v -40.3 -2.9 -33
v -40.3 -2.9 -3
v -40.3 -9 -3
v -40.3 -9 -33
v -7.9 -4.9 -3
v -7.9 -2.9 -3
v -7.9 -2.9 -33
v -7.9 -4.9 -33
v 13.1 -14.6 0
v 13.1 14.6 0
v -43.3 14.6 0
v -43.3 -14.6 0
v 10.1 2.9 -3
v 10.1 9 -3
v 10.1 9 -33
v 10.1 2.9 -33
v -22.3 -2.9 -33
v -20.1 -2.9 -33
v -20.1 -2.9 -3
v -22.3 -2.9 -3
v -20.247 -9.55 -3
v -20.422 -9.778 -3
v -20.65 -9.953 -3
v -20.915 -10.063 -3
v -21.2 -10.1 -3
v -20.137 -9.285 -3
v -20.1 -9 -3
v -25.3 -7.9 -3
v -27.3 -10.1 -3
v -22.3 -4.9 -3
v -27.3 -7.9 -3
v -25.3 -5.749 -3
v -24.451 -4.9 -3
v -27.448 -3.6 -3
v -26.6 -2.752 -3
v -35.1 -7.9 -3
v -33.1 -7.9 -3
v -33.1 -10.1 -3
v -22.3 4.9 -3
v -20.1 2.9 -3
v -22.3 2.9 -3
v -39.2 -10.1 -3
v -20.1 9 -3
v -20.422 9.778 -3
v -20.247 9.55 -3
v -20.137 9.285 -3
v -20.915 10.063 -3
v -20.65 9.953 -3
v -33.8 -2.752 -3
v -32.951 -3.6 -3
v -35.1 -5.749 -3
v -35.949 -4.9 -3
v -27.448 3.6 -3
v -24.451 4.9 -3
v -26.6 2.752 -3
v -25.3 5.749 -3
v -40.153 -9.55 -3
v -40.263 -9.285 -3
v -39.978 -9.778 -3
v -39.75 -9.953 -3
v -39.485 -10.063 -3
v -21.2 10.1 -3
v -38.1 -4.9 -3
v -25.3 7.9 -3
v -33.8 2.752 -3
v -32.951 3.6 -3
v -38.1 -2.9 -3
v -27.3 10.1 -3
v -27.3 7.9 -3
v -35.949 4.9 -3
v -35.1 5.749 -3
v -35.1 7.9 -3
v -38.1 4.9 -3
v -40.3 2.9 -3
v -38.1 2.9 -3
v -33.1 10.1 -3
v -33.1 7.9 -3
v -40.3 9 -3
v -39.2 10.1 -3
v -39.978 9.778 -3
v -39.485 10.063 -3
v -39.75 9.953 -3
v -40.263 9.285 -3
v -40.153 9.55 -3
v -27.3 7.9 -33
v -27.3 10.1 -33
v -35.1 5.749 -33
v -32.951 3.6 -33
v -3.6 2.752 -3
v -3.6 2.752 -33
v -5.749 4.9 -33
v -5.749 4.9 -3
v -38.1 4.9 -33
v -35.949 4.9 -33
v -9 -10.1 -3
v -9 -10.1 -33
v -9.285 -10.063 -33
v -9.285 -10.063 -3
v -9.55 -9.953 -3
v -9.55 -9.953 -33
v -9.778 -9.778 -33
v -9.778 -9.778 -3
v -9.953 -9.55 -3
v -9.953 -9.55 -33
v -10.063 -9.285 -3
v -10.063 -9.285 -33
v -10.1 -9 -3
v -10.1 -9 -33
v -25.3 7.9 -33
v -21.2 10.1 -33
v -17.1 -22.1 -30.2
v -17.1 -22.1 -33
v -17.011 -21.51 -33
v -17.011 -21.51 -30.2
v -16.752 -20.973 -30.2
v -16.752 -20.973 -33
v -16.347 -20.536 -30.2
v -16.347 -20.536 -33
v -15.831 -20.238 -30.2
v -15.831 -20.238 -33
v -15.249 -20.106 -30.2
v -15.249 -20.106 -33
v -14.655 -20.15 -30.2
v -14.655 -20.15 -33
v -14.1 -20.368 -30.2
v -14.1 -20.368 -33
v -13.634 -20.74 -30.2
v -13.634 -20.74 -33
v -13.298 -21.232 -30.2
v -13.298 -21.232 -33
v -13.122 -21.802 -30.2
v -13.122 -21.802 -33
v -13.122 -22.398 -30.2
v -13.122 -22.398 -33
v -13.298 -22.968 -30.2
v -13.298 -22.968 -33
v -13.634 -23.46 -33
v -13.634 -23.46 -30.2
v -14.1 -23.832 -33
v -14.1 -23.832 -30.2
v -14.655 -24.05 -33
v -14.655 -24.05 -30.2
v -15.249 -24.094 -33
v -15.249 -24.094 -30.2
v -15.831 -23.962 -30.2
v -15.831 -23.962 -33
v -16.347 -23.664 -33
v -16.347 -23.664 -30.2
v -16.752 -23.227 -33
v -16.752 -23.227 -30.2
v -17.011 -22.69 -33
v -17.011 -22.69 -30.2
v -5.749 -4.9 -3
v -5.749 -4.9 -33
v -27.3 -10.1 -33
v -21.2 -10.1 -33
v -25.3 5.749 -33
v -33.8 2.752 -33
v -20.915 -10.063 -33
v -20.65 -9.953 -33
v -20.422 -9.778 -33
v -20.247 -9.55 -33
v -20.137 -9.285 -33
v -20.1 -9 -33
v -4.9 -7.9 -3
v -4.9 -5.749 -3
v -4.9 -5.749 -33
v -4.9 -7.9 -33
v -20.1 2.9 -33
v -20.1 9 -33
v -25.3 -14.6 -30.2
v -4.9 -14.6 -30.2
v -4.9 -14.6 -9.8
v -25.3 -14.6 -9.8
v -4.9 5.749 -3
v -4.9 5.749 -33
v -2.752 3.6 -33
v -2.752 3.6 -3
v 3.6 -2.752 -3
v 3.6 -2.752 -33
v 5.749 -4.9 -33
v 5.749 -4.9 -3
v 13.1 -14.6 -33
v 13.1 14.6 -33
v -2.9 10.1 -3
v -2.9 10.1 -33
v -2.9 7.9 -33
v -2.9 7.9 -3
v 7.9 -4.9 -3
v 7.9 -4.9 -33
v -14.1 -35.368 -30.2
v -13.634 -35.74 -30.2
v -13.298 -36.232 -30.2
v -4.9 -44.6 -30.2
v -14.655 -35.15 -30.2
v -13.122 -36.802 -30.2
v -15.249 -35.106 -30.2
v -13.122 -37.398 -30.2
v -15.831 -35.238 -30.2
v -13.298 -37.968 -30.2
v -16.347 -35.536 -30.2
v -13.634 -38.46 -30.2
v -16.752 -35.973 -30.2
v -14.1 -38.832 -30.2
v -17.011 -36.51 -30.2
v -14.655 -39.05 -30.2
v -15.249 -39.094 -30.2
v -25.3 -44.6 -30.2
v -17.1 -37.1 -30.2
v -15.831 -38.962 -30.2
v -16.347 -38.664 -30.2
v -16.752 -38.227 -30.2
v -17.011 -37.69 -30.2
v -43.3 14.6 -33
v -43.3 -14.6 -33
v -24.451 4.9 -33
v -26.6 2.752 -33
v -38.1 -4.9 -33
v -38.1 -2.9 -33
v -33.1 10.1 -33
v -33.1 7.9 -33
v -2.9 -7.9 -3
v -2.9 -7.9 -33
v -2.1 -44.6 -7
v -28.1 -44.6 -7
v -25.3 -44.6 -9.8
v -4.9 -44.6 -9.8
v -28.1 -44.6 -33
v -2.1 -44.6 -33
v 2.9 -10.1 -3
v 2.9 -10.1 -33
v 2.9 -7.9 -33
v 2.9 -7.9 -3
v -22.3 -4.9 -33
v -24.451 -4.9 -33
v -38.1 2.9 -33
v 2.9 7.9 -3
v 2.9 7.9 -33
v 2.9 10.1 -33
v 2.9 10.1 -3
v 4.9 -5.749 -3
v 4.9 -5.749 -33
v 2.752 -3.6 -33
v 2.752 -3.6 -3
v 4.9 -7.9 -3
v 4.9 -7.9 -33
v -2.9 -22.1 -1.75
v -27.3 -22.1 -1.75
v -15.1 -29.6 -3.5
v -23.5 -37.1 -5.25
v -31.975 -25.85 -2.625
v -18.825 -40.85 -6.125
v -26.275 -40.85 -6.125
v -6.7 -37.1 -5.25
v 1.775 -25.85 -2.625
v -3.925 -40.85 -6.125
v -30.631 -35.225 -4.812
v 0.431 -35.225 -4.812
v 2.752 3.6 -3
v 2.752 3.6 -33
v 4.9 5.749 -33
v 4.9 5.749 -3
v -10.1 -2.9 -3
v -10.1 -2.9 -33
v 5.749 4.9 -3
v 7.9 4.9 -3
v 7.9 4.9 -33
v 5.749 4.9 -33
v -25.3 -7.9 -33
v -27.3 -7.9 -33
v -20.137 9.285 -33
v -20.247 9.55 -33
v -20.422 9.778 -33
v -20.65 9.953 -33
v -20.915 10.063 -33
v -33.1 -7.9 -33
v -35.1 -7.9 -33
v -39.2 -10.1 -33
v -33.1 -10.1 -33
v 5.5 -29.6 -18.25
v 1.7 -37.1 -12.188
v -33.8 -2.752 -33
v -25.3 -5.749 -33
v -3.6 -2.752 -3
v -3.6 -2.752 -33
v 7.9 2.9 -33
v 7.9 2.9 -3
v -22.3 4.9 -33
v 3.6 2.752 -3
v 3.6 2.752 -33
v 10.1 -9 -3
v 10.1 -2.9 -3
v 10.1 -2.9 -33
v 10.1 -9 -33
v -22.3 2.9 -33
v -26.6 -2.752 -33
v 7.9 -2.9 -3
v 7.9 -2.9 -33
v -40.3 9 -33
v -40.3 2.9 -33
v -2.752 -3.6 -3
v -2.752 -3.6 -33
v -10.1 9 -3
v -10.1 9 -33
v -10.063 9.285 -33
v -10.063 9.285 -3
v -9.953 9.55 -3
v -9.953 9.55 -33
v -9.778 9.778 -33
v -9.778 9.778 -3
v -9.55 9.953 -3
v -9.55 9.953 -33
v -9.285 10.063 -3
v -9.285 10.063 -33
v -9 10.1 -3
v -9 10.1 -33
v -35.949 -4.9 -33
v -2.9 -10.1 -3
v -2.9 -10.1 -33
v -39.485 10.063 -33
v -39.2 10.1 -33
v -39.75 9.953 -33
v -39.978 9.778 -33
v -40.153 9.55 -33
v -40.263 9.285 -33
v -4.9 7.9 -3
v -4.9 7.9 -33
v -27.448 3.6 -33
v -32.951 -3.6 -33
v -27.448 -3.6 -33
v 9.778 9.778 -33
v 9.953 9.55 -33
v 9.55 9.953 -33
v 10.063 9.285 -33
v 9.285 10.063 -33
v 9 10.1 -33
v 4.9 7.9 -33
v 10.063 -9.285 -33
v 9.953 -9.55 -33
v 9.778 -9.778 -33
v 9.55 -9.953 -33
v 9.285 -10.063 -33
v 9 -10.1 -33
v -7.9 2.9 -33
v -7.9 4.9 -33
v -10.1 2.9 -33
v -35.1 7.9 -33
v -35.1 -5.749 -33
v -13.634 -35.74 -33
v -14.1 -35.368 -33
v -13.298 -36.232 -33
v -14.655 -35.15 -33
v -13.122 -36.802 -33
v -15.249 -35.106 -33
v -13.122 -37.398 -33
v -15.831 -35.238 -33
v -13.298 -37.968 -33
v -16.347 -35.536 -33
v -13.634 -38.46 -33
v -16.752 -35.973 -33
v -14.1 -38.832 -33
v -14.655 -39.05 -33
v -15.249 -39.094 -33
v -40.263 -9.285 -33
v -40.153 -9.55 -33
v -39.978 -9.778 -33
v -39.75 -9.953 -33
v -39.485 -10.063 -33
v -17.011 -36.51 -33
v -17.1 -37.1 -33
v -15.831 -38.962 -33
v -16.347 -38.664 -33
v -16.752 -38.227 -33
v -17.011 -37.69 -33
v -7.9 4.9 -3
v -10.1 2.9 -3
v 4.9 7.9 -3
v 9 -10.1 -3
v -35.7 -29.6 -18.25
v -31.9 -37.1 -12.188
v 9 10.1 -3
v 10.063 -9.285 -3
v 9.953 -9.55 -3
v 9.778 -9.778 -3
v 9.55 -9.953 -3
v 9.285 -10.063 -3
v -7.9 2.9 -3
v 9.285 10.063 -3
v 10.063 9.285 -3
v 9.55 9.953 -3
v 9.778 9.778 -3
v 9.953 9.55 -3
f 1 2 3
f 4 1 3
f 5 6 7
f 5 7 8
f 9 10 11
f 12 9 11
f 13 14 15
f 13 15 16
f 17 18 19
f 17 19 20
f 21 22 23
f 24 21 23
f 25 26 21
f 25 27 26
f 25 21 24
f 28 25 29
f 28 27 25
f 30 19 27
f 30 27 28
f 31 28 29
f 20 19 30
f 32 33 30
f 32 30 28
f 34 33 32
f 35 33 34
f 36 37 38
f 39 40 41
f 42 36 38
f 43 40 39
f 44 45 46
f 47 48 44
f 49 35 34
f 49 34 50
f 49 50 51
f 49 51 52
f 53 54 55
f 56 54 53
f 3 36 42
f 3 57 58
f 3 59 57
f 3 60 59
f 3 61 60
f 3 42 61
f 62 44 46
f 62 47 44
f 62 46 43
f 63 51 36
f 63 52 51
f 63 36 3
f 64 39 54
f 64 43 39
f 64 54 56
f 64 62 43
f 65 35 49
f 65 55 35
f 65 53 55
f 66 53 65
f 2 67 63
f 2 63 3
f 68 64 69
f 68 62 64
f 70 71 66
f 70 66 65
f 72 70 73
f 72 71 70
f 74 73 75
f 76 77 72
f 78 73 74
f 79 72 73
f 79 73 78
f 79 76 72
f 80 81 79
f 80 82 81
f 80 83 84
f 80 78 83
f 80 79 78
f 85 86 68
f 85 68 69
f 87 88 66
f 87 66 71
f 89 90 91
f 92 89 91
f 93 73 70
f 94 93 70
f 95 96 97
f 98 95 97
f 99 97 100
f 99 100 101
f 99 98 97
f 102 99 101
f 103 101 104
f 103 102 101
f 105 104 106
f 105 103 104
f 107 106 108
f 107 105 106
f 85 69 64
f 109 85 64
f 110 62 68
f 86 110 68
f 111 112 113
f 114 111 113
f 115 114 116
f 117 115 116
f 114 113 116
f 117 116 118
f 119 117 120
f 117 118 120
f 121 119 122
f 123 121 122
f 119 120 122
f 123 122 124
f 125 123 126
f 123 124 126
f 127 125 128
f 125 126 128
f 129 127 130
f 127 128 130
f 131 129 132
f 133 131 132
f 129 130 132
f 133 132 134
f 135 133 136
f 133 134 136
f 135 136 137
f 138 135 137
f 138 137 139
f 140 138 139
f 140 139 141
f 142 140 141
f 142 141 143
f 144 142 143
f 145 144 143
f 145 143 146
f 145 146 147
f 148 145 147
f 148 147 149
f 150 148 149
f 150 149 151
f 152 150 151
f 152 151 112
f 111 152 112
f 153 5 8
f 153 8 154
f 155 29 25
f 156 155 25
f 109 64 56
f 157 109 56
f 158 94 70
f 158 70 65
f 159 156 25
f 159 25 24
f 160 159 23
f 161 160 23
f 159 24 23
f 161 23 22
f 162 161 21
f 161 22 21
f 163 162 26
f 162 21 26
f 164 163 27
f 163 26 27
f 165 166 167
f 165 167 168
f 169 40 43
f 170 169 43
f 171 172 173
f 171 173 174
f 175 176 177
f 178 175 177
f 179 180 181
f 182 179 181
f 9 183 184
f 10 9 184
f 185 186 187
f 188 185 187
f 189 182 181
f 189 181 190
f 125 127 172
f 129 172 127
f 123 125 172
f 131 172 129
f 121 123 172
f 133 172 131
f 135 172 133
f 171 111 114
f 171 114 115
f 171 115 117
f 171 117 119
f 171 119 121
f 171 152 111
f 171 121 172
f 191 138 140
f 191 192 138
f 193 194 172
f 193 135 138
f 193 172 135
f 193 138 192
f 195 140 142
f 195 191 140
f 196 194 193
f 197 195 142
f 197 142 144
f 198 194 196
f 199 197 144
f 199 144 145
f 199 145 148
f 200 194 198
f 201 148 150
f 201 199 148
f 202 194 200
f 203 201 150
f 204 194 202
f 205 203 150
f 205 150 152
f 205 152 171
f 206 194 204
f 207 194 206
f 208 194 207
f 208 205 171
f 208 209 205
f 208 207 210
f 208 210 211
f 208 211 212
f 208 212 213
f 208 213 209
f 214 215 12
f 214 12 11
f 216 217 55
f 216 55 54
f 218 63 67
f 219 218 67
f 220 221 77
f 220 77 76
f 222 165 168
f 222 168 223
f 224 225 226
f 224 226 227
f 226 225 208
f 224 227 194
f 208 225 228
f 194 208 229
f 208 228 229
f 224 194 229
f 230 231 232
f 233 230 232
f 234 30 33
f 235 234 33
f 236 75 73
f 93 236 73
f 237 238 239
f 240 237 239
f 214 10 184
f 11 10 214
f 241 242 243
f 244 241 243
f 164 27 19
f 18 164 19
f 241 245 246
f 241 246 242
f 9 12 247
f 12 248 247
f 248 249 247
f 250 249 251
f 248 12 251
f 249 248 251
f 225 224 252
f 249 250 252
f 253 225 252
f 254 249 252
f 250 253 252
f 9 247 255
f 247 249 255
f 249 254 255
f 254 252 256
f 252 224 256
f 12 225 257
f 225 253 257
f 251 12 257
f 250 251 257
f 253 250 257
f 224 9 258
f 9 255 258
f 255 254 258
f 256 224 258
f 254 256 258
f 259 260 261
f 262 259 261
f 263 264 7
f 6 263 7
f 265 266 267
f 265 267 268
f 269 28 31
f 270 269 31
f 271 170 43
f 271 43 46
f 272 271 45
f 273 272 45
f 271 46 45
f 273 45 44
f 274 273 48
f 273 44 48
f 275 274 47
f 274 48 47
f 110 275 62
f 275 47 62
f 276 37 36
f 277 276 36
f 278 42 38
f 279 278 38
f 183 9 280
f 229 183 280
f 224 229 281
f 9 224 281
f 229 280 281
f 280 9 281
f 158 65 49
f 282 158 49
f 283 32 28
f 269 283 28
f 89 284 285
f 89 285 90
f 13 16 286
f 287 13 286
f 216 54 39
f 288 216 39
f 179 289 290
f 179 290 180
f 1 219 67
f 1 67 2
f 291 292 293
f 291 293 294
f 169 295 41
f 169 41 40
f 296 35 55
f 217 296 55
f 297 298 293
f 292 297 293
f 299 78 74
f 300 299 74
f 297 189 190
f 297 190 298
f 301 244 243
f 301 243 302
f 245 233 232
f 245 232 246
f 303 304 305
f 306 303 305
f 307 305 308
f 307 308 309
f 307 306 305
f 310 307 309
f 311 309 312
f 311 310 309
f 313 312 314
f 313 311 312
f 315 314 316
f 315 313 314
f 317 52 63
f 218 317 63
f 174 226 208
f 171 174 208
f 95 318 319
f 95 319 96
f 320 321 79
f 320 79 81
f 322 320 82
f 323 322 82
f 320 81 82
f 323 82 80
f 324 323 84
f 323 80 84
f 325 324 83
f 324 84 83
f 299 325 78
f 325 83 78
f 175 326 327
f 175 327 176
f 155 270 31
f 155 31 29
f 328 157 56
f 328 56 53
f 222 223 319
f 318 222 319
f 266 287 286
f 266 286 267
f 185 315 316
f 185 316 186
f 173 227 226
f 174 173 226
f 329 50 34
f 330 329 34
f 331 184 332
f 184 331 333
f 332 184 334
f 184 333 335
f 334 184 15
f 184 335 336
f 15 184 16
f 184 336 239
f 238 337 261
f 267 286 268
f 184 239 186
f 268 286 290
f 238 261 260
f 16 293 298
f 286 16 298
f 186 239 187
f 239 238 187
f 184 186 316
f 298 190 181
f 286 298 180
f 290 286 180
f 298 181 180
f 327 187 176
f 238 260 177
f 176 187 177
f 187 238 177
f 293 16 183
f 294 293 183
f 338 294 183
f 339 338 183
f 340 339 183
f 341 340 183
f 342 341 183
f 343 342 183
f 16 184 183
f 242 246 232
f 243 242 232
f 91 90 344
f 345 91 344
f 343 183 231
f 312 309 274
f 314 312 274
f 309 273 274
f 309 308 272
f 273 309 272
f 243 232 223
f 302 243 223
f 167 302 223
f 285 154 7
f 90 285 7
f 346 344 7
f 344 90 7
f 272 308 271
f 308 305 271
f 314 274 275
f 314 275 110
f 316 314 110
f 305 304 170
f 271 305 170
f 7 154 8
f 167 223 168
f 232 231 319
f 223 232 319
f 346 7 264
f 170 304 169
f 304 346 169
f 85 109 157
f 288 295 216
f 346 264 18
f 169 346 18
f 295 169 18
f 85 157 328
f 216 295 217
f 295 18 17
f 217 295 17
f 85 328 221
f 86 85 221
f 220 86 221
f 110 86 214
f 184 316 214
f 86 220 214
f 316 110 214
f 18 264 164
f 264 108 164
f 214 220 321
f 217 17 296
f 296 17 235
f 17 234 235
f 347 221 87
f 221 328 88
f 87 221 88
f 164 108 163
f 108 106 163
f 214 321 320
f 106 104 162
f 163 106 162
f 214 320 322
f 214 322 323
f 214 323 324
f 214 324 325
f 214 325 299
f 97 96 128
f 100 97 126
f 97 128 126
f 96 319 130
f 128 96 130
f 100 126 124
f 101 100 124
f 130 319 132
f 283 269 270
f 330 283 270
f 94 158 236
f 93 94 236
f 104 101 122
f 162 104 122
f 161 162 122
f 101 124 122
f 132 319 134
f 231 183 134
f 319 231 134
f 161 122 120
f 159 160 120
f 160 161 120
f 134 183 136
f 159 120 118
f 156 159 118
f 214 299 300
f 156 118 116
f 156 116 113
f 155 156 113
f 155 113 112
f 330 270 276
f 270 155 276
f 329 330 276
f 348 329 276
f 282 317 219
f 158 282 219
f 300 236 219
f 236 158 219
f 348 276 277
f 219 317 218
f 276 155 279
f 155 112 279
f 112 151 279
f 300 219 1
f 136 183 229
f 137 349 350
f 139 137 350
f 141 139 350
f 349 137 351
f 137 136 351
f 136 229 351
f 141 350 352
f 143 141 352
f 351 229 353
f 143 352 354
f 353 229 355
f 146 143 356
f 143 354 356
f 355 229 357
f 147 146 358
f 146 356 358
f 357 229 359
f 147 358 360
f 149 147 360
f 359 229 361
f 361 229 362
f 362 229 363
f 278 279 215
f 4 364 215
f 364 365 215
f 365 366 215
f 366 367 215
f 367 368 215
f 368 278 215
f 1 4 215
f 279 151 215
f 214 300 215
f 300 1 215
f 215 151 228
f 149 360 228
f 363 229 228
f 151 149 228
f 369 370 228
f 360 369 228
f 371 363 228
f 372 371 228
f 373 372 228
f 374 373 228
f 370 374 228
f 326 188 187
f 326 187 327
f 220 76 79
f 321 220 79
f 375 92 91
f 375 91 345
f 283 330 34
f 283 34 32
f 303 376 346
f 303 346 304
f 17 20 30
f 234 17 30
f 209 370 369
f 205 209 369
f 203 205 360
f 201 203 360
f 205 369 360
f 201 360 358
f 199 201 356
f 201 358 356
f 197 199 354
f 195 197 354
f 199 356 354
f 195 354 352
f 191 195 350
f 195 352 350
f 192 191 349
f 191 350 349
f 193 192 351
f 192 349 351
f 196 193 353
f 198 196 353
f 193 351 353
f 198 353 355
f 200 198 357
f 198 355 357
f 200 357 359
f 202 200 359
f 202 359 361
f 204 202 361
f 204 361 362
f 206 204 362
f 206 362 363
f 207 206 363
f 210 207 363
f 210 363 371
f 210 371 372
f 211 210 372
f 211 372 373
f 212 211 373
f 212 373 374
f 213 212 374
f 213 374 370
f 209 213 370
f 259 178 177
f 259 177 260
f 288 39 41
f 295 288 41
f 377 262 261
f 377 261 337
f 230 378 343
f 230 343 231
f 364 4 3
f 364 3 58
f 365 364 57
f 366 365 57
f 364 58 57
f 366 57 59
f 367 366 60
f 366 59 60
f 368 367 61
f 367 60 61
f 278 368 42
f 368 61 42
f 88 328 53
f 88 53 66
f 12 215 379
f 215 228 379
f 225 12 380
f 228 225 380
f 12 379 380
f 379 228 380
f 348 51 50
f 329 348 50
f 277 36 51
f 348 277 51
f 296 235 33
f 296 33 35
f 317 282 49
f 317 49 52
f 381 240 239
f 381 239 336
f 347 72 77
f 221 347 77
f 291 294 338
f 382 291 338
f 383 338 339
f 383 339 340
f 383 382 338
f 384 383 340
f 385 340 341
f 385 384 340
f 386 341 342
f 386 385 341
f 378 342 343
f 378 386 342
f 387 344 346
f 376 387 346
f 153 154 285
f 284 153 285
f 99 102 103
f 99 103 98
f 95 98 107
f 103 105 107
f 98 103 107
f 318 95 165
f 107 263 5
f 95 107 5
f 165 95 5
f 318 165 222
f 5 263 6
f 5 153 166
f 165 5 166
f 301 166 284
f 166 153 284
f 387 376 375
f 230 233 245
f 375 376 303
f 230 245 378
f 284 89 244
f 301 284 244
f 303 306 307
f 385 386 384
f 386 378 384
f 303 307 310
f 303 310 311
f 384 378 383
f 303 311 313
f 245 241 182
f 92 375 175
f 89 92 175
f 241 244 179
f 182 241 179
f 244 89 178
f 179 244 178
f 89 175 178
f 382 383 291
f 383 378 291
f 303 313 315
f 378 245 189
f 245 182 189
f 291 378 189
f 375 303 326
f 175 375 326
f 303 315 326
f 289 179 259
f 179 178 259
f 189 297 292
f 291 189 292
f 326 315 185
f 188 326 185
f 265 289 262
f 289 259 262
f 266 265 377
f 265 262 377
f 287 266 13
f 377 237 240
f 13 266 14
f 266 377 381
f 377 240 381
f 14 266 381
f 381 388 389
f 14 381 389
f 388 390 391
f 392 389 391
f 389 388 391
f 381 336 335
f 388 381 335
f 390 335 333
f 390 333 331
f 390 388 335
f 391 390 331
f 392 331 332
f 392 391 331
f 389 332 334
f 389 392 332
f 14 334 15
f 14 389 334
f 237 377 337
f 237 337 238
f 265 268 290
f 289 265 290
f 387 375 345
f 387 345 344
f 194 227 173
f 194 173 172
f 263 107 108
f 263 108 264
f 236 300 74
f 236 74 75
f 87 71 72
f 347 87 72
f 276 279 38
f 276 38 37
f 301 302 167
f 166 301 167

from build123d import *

# Parameters (mm, degrees)
SKETCH1_W           = 28.2
SKETCH1_H           = 29.2
BOSS_EXTRUDE1_DEPTH = 3
BOSS_EXTRUDE2_START = -3
SKETCH1_3_W         = 28.2
SKETCH1_3_H         = 29.2
BOSS_EXTRUDE2_DEPTH = 30
SKETCH3_3_W         = 20.4
SKETCH3_3_H         = 20.4
CUT_EXTRUDE1_DEPTH  = 30
CUT_EXTRUDE2_REACH  = 72.378
SKETCH4_R           = 2


with BuildPart() as part:
    # Sketch1 → Boss-Extrude1 (new body)
    with BuildSketch(Plane.XY):
        with Locations((-1, 0)):
            Rectangle(SKETCH1_W, SKETCH1_H)
    boss_extrude1 = extrude(amount=-BOSS_EXTRUDE1_DEPTH)

    # Sketch1<3> → Boss-Extrude2 (add)
    with BuildSketch(Plane.XY.offset(BOSS_EXTRUDE2_START)):
        with Locations((-1, 0)):
            Rectangle(SKETCH1_3_W, SKETCH1_3_H)
        with BuildLine():
            Line((-10.1, 2.9), (-10.1, 9))
            ThreePointArc((-10.1, 9), (-9.777817459, 9.777817459), (-9, 10.1))
            Line((-9, 10.1), (-2.9, 10.1))
            Line((-2.9, 10.1), (-2.9, 7.9))
            Line((-2.9, 7.9), (-4.9, 7.9))
            Line((-4.9, 7.9), (-4.9, 5.749))
            Line((-4.9, 5.749), (-2.7515, 3.6005))
            Line((-2.7515, 3.6005), (2.7515, 3.6005))
            Line((2.7515, 3.6005), (4.9, 5.749))
            Line((4.9, 5.749), (4.9, 7.9))
            Line((4.9, 7.9), (2.9, 7.9))
            Line((2.9, 7.9), (2.9, 10.1))
            Line((2.9, 10.1), (9, 10.1))
            ThreePointArc((9, 10.1), (9.777817459, 9.777817459), (10.1, 9))
            Line((10.1, 9), (10.1, 2.9))
            Line((10.1, 2.9), (7.9, 2.9))
            Line((7.9, 2.9), (7.9, 4.9))
            Line((7.9, 4.9), (5.749, 4.9))
            Line((5.749, 4.9), (3.6005, 2.7515))
            Line((3.6005, 2.7515), (3.6005, -2.7515))
            Line((3.6005, -2.7515), (5.749, -4.9))
            Line((5.749, -4.9), (7.9, -4.9))
            Line((7.9, -4.9), (7.9, -2.9))
            Line((7.9, -2.9), (10.1, -2.9))
            Line((10.1, -2.9), (10.1, -9))
            ThreePointArc((10.1, -9), (9.777817459, -9.777817459), (9, -10.1))
            Line((9, -10.1), (2.9, -10.1))
            Line((2.9, -10.1), (2.9, -7.9))
            Line((2.9, -7.9), (4.9, -7.9))
            Line((4.9, -7.9), (4.9, -5.749))
            Line((4.9, -5.749), (2.7515, -3.6005))
            Line((2.7515, -3.6005), (-2.7515, -3.6005))
            Line((-2.7515, -3.6005), (-4.9, -5.749))
            Line((-4.9, -5.749), (-4.9, -7.9))
            Line((-4.9, -7.9), (-2.9, -7.9))
            Line((-2.9, -7.9), (-2.9, -10.1))
            Line((-2.9, -10.1), (-9, -10.1))
            ThreePointArc((-9, -10.1), (-9.777817459, -9.777817459), (-10.1, -9))
            Line((-10.1, -9), (-10.1, -2.9))
            Line((-10.1, -2.9), (-7.9, -2.9))
            Line((-7.9, -2.9), (-7.9, -4.9))
            Line((-7.9, -4.9), (-5.749, -4.9))
            Line((-5.749, -4.9), (-3.6005, -2.7515))
            Line((-3.6005, -2.7515), (-3.6005, 2.7515))
            Line((-3.6005, 2.7515), (-5.749, 4.9))
            Line((-5.749, 4.9), (-7.9, 4.9))
            Line((-7.9, 4.9), (-7.9, 2.9))
            Line((-7.9, 2.9), (-10.1, 2.9))
        make_face(mode=Mode.SUBTRACT)
    boss_extrude2 = extrude(amount=-BOSS_EXTRUDE2_DEPTH)

    # Mirror1: Boss-Extrude1, Boss-Extrude2 across plane
    add(boss_extrude1.mirror(Plane(origin=(-15.1, 0, -3), x_dir=(0, 0, 1), z_dir=(-1, 0, 0))))
    add(boss_extrude2.mirror(Plane(origin=(-15.1, 0, -3), x_dir=(0, 0, 1), z_dir=(-1, 0, 0))))

    # Sketch3 → section 1 of loft1
    with BuildSketch(Plane(origin=(0, -44.6, 0), x_dir=(-1, 0, 0), z_dir=(0, -1, 0)), mode=Mode.PRIVATE) as loft1_s1:
        with BuildLine():
            Line((2.1, 7), (28.1, 7))
            Line((28.1, 7), (28.1, 33))
            Line((28.1, 33), (2.1, 33))
            Line((2.1, 33), (2.1, 7))
        make_face()
    # loft from a face of the part (loft1)
    loft([part.faces().sort_by_distance((-15.1, -14.6, -16.5))[0], loft1_s1.sketch])

    # Sketch3<3> → Cut-Extrude1 (cut)
    with BuildSketch(Plane(origin=(0, -44.6, 0), x_dir=(-1, 0, 0), z_dir=(0, -1, 0))):
        with Locations((15.1, 20)):
            Rectangle(SKETCH3_3_W, SKETCH3_3_H)
    extrude(amount=-CUT_EXTRUDE1_DEPTH, mode=Mode.SUBTRACT)

    # Sketch4 → Cut-Extrude2 (cut, up to next)
    with BuildSketch(Plane(origin=(0, 0, -33), x_dir=(-1, 0, 0), z_dir=(0, 0, -1)), mode=Mode.PRIVATE) as cut_extrude2_sk1:
        with Locations((15.1, -37.1)):
            Circle(SKETCH4_R)
    cut_extrude2_tool1 = extrude(cut_extrude2_sk1.sketch, amount=-CUT_EXTRUDE2_REACH, mode=Mode.PRIVATE) & part.part
    # Sketch4 → Cut-Extrude2 (cut, up to next)
    with BuildSketch(Plane(origin=(0, 0, -33), x_dir=(-1, 0, 0), z_dir=(0, 0, -1)), mode=Mode.PRIVATE) as cut_extrude2_sk2:
        with Locations((15.1, -22.1)):
            Circle(SKETCH4_R)
    cut_extrude2_tool2 = extrude(cut_extrude2_sk2.sketch, amount=-CUT_EXTRUDE2_REACH, mode=Mode.PRIVATE) & part.part
    add(cut_extrude2_tool1.solids().sort_by_distance((-15.1, -37.1, -33))[0], mode=Mode.SUBTRACT)
    add(cut_extrude2_tool2.solids().sort_by_distance((-15.1, -22.1, -33))[0], mode=Mode.SUBTRACT)


solid = part.part
